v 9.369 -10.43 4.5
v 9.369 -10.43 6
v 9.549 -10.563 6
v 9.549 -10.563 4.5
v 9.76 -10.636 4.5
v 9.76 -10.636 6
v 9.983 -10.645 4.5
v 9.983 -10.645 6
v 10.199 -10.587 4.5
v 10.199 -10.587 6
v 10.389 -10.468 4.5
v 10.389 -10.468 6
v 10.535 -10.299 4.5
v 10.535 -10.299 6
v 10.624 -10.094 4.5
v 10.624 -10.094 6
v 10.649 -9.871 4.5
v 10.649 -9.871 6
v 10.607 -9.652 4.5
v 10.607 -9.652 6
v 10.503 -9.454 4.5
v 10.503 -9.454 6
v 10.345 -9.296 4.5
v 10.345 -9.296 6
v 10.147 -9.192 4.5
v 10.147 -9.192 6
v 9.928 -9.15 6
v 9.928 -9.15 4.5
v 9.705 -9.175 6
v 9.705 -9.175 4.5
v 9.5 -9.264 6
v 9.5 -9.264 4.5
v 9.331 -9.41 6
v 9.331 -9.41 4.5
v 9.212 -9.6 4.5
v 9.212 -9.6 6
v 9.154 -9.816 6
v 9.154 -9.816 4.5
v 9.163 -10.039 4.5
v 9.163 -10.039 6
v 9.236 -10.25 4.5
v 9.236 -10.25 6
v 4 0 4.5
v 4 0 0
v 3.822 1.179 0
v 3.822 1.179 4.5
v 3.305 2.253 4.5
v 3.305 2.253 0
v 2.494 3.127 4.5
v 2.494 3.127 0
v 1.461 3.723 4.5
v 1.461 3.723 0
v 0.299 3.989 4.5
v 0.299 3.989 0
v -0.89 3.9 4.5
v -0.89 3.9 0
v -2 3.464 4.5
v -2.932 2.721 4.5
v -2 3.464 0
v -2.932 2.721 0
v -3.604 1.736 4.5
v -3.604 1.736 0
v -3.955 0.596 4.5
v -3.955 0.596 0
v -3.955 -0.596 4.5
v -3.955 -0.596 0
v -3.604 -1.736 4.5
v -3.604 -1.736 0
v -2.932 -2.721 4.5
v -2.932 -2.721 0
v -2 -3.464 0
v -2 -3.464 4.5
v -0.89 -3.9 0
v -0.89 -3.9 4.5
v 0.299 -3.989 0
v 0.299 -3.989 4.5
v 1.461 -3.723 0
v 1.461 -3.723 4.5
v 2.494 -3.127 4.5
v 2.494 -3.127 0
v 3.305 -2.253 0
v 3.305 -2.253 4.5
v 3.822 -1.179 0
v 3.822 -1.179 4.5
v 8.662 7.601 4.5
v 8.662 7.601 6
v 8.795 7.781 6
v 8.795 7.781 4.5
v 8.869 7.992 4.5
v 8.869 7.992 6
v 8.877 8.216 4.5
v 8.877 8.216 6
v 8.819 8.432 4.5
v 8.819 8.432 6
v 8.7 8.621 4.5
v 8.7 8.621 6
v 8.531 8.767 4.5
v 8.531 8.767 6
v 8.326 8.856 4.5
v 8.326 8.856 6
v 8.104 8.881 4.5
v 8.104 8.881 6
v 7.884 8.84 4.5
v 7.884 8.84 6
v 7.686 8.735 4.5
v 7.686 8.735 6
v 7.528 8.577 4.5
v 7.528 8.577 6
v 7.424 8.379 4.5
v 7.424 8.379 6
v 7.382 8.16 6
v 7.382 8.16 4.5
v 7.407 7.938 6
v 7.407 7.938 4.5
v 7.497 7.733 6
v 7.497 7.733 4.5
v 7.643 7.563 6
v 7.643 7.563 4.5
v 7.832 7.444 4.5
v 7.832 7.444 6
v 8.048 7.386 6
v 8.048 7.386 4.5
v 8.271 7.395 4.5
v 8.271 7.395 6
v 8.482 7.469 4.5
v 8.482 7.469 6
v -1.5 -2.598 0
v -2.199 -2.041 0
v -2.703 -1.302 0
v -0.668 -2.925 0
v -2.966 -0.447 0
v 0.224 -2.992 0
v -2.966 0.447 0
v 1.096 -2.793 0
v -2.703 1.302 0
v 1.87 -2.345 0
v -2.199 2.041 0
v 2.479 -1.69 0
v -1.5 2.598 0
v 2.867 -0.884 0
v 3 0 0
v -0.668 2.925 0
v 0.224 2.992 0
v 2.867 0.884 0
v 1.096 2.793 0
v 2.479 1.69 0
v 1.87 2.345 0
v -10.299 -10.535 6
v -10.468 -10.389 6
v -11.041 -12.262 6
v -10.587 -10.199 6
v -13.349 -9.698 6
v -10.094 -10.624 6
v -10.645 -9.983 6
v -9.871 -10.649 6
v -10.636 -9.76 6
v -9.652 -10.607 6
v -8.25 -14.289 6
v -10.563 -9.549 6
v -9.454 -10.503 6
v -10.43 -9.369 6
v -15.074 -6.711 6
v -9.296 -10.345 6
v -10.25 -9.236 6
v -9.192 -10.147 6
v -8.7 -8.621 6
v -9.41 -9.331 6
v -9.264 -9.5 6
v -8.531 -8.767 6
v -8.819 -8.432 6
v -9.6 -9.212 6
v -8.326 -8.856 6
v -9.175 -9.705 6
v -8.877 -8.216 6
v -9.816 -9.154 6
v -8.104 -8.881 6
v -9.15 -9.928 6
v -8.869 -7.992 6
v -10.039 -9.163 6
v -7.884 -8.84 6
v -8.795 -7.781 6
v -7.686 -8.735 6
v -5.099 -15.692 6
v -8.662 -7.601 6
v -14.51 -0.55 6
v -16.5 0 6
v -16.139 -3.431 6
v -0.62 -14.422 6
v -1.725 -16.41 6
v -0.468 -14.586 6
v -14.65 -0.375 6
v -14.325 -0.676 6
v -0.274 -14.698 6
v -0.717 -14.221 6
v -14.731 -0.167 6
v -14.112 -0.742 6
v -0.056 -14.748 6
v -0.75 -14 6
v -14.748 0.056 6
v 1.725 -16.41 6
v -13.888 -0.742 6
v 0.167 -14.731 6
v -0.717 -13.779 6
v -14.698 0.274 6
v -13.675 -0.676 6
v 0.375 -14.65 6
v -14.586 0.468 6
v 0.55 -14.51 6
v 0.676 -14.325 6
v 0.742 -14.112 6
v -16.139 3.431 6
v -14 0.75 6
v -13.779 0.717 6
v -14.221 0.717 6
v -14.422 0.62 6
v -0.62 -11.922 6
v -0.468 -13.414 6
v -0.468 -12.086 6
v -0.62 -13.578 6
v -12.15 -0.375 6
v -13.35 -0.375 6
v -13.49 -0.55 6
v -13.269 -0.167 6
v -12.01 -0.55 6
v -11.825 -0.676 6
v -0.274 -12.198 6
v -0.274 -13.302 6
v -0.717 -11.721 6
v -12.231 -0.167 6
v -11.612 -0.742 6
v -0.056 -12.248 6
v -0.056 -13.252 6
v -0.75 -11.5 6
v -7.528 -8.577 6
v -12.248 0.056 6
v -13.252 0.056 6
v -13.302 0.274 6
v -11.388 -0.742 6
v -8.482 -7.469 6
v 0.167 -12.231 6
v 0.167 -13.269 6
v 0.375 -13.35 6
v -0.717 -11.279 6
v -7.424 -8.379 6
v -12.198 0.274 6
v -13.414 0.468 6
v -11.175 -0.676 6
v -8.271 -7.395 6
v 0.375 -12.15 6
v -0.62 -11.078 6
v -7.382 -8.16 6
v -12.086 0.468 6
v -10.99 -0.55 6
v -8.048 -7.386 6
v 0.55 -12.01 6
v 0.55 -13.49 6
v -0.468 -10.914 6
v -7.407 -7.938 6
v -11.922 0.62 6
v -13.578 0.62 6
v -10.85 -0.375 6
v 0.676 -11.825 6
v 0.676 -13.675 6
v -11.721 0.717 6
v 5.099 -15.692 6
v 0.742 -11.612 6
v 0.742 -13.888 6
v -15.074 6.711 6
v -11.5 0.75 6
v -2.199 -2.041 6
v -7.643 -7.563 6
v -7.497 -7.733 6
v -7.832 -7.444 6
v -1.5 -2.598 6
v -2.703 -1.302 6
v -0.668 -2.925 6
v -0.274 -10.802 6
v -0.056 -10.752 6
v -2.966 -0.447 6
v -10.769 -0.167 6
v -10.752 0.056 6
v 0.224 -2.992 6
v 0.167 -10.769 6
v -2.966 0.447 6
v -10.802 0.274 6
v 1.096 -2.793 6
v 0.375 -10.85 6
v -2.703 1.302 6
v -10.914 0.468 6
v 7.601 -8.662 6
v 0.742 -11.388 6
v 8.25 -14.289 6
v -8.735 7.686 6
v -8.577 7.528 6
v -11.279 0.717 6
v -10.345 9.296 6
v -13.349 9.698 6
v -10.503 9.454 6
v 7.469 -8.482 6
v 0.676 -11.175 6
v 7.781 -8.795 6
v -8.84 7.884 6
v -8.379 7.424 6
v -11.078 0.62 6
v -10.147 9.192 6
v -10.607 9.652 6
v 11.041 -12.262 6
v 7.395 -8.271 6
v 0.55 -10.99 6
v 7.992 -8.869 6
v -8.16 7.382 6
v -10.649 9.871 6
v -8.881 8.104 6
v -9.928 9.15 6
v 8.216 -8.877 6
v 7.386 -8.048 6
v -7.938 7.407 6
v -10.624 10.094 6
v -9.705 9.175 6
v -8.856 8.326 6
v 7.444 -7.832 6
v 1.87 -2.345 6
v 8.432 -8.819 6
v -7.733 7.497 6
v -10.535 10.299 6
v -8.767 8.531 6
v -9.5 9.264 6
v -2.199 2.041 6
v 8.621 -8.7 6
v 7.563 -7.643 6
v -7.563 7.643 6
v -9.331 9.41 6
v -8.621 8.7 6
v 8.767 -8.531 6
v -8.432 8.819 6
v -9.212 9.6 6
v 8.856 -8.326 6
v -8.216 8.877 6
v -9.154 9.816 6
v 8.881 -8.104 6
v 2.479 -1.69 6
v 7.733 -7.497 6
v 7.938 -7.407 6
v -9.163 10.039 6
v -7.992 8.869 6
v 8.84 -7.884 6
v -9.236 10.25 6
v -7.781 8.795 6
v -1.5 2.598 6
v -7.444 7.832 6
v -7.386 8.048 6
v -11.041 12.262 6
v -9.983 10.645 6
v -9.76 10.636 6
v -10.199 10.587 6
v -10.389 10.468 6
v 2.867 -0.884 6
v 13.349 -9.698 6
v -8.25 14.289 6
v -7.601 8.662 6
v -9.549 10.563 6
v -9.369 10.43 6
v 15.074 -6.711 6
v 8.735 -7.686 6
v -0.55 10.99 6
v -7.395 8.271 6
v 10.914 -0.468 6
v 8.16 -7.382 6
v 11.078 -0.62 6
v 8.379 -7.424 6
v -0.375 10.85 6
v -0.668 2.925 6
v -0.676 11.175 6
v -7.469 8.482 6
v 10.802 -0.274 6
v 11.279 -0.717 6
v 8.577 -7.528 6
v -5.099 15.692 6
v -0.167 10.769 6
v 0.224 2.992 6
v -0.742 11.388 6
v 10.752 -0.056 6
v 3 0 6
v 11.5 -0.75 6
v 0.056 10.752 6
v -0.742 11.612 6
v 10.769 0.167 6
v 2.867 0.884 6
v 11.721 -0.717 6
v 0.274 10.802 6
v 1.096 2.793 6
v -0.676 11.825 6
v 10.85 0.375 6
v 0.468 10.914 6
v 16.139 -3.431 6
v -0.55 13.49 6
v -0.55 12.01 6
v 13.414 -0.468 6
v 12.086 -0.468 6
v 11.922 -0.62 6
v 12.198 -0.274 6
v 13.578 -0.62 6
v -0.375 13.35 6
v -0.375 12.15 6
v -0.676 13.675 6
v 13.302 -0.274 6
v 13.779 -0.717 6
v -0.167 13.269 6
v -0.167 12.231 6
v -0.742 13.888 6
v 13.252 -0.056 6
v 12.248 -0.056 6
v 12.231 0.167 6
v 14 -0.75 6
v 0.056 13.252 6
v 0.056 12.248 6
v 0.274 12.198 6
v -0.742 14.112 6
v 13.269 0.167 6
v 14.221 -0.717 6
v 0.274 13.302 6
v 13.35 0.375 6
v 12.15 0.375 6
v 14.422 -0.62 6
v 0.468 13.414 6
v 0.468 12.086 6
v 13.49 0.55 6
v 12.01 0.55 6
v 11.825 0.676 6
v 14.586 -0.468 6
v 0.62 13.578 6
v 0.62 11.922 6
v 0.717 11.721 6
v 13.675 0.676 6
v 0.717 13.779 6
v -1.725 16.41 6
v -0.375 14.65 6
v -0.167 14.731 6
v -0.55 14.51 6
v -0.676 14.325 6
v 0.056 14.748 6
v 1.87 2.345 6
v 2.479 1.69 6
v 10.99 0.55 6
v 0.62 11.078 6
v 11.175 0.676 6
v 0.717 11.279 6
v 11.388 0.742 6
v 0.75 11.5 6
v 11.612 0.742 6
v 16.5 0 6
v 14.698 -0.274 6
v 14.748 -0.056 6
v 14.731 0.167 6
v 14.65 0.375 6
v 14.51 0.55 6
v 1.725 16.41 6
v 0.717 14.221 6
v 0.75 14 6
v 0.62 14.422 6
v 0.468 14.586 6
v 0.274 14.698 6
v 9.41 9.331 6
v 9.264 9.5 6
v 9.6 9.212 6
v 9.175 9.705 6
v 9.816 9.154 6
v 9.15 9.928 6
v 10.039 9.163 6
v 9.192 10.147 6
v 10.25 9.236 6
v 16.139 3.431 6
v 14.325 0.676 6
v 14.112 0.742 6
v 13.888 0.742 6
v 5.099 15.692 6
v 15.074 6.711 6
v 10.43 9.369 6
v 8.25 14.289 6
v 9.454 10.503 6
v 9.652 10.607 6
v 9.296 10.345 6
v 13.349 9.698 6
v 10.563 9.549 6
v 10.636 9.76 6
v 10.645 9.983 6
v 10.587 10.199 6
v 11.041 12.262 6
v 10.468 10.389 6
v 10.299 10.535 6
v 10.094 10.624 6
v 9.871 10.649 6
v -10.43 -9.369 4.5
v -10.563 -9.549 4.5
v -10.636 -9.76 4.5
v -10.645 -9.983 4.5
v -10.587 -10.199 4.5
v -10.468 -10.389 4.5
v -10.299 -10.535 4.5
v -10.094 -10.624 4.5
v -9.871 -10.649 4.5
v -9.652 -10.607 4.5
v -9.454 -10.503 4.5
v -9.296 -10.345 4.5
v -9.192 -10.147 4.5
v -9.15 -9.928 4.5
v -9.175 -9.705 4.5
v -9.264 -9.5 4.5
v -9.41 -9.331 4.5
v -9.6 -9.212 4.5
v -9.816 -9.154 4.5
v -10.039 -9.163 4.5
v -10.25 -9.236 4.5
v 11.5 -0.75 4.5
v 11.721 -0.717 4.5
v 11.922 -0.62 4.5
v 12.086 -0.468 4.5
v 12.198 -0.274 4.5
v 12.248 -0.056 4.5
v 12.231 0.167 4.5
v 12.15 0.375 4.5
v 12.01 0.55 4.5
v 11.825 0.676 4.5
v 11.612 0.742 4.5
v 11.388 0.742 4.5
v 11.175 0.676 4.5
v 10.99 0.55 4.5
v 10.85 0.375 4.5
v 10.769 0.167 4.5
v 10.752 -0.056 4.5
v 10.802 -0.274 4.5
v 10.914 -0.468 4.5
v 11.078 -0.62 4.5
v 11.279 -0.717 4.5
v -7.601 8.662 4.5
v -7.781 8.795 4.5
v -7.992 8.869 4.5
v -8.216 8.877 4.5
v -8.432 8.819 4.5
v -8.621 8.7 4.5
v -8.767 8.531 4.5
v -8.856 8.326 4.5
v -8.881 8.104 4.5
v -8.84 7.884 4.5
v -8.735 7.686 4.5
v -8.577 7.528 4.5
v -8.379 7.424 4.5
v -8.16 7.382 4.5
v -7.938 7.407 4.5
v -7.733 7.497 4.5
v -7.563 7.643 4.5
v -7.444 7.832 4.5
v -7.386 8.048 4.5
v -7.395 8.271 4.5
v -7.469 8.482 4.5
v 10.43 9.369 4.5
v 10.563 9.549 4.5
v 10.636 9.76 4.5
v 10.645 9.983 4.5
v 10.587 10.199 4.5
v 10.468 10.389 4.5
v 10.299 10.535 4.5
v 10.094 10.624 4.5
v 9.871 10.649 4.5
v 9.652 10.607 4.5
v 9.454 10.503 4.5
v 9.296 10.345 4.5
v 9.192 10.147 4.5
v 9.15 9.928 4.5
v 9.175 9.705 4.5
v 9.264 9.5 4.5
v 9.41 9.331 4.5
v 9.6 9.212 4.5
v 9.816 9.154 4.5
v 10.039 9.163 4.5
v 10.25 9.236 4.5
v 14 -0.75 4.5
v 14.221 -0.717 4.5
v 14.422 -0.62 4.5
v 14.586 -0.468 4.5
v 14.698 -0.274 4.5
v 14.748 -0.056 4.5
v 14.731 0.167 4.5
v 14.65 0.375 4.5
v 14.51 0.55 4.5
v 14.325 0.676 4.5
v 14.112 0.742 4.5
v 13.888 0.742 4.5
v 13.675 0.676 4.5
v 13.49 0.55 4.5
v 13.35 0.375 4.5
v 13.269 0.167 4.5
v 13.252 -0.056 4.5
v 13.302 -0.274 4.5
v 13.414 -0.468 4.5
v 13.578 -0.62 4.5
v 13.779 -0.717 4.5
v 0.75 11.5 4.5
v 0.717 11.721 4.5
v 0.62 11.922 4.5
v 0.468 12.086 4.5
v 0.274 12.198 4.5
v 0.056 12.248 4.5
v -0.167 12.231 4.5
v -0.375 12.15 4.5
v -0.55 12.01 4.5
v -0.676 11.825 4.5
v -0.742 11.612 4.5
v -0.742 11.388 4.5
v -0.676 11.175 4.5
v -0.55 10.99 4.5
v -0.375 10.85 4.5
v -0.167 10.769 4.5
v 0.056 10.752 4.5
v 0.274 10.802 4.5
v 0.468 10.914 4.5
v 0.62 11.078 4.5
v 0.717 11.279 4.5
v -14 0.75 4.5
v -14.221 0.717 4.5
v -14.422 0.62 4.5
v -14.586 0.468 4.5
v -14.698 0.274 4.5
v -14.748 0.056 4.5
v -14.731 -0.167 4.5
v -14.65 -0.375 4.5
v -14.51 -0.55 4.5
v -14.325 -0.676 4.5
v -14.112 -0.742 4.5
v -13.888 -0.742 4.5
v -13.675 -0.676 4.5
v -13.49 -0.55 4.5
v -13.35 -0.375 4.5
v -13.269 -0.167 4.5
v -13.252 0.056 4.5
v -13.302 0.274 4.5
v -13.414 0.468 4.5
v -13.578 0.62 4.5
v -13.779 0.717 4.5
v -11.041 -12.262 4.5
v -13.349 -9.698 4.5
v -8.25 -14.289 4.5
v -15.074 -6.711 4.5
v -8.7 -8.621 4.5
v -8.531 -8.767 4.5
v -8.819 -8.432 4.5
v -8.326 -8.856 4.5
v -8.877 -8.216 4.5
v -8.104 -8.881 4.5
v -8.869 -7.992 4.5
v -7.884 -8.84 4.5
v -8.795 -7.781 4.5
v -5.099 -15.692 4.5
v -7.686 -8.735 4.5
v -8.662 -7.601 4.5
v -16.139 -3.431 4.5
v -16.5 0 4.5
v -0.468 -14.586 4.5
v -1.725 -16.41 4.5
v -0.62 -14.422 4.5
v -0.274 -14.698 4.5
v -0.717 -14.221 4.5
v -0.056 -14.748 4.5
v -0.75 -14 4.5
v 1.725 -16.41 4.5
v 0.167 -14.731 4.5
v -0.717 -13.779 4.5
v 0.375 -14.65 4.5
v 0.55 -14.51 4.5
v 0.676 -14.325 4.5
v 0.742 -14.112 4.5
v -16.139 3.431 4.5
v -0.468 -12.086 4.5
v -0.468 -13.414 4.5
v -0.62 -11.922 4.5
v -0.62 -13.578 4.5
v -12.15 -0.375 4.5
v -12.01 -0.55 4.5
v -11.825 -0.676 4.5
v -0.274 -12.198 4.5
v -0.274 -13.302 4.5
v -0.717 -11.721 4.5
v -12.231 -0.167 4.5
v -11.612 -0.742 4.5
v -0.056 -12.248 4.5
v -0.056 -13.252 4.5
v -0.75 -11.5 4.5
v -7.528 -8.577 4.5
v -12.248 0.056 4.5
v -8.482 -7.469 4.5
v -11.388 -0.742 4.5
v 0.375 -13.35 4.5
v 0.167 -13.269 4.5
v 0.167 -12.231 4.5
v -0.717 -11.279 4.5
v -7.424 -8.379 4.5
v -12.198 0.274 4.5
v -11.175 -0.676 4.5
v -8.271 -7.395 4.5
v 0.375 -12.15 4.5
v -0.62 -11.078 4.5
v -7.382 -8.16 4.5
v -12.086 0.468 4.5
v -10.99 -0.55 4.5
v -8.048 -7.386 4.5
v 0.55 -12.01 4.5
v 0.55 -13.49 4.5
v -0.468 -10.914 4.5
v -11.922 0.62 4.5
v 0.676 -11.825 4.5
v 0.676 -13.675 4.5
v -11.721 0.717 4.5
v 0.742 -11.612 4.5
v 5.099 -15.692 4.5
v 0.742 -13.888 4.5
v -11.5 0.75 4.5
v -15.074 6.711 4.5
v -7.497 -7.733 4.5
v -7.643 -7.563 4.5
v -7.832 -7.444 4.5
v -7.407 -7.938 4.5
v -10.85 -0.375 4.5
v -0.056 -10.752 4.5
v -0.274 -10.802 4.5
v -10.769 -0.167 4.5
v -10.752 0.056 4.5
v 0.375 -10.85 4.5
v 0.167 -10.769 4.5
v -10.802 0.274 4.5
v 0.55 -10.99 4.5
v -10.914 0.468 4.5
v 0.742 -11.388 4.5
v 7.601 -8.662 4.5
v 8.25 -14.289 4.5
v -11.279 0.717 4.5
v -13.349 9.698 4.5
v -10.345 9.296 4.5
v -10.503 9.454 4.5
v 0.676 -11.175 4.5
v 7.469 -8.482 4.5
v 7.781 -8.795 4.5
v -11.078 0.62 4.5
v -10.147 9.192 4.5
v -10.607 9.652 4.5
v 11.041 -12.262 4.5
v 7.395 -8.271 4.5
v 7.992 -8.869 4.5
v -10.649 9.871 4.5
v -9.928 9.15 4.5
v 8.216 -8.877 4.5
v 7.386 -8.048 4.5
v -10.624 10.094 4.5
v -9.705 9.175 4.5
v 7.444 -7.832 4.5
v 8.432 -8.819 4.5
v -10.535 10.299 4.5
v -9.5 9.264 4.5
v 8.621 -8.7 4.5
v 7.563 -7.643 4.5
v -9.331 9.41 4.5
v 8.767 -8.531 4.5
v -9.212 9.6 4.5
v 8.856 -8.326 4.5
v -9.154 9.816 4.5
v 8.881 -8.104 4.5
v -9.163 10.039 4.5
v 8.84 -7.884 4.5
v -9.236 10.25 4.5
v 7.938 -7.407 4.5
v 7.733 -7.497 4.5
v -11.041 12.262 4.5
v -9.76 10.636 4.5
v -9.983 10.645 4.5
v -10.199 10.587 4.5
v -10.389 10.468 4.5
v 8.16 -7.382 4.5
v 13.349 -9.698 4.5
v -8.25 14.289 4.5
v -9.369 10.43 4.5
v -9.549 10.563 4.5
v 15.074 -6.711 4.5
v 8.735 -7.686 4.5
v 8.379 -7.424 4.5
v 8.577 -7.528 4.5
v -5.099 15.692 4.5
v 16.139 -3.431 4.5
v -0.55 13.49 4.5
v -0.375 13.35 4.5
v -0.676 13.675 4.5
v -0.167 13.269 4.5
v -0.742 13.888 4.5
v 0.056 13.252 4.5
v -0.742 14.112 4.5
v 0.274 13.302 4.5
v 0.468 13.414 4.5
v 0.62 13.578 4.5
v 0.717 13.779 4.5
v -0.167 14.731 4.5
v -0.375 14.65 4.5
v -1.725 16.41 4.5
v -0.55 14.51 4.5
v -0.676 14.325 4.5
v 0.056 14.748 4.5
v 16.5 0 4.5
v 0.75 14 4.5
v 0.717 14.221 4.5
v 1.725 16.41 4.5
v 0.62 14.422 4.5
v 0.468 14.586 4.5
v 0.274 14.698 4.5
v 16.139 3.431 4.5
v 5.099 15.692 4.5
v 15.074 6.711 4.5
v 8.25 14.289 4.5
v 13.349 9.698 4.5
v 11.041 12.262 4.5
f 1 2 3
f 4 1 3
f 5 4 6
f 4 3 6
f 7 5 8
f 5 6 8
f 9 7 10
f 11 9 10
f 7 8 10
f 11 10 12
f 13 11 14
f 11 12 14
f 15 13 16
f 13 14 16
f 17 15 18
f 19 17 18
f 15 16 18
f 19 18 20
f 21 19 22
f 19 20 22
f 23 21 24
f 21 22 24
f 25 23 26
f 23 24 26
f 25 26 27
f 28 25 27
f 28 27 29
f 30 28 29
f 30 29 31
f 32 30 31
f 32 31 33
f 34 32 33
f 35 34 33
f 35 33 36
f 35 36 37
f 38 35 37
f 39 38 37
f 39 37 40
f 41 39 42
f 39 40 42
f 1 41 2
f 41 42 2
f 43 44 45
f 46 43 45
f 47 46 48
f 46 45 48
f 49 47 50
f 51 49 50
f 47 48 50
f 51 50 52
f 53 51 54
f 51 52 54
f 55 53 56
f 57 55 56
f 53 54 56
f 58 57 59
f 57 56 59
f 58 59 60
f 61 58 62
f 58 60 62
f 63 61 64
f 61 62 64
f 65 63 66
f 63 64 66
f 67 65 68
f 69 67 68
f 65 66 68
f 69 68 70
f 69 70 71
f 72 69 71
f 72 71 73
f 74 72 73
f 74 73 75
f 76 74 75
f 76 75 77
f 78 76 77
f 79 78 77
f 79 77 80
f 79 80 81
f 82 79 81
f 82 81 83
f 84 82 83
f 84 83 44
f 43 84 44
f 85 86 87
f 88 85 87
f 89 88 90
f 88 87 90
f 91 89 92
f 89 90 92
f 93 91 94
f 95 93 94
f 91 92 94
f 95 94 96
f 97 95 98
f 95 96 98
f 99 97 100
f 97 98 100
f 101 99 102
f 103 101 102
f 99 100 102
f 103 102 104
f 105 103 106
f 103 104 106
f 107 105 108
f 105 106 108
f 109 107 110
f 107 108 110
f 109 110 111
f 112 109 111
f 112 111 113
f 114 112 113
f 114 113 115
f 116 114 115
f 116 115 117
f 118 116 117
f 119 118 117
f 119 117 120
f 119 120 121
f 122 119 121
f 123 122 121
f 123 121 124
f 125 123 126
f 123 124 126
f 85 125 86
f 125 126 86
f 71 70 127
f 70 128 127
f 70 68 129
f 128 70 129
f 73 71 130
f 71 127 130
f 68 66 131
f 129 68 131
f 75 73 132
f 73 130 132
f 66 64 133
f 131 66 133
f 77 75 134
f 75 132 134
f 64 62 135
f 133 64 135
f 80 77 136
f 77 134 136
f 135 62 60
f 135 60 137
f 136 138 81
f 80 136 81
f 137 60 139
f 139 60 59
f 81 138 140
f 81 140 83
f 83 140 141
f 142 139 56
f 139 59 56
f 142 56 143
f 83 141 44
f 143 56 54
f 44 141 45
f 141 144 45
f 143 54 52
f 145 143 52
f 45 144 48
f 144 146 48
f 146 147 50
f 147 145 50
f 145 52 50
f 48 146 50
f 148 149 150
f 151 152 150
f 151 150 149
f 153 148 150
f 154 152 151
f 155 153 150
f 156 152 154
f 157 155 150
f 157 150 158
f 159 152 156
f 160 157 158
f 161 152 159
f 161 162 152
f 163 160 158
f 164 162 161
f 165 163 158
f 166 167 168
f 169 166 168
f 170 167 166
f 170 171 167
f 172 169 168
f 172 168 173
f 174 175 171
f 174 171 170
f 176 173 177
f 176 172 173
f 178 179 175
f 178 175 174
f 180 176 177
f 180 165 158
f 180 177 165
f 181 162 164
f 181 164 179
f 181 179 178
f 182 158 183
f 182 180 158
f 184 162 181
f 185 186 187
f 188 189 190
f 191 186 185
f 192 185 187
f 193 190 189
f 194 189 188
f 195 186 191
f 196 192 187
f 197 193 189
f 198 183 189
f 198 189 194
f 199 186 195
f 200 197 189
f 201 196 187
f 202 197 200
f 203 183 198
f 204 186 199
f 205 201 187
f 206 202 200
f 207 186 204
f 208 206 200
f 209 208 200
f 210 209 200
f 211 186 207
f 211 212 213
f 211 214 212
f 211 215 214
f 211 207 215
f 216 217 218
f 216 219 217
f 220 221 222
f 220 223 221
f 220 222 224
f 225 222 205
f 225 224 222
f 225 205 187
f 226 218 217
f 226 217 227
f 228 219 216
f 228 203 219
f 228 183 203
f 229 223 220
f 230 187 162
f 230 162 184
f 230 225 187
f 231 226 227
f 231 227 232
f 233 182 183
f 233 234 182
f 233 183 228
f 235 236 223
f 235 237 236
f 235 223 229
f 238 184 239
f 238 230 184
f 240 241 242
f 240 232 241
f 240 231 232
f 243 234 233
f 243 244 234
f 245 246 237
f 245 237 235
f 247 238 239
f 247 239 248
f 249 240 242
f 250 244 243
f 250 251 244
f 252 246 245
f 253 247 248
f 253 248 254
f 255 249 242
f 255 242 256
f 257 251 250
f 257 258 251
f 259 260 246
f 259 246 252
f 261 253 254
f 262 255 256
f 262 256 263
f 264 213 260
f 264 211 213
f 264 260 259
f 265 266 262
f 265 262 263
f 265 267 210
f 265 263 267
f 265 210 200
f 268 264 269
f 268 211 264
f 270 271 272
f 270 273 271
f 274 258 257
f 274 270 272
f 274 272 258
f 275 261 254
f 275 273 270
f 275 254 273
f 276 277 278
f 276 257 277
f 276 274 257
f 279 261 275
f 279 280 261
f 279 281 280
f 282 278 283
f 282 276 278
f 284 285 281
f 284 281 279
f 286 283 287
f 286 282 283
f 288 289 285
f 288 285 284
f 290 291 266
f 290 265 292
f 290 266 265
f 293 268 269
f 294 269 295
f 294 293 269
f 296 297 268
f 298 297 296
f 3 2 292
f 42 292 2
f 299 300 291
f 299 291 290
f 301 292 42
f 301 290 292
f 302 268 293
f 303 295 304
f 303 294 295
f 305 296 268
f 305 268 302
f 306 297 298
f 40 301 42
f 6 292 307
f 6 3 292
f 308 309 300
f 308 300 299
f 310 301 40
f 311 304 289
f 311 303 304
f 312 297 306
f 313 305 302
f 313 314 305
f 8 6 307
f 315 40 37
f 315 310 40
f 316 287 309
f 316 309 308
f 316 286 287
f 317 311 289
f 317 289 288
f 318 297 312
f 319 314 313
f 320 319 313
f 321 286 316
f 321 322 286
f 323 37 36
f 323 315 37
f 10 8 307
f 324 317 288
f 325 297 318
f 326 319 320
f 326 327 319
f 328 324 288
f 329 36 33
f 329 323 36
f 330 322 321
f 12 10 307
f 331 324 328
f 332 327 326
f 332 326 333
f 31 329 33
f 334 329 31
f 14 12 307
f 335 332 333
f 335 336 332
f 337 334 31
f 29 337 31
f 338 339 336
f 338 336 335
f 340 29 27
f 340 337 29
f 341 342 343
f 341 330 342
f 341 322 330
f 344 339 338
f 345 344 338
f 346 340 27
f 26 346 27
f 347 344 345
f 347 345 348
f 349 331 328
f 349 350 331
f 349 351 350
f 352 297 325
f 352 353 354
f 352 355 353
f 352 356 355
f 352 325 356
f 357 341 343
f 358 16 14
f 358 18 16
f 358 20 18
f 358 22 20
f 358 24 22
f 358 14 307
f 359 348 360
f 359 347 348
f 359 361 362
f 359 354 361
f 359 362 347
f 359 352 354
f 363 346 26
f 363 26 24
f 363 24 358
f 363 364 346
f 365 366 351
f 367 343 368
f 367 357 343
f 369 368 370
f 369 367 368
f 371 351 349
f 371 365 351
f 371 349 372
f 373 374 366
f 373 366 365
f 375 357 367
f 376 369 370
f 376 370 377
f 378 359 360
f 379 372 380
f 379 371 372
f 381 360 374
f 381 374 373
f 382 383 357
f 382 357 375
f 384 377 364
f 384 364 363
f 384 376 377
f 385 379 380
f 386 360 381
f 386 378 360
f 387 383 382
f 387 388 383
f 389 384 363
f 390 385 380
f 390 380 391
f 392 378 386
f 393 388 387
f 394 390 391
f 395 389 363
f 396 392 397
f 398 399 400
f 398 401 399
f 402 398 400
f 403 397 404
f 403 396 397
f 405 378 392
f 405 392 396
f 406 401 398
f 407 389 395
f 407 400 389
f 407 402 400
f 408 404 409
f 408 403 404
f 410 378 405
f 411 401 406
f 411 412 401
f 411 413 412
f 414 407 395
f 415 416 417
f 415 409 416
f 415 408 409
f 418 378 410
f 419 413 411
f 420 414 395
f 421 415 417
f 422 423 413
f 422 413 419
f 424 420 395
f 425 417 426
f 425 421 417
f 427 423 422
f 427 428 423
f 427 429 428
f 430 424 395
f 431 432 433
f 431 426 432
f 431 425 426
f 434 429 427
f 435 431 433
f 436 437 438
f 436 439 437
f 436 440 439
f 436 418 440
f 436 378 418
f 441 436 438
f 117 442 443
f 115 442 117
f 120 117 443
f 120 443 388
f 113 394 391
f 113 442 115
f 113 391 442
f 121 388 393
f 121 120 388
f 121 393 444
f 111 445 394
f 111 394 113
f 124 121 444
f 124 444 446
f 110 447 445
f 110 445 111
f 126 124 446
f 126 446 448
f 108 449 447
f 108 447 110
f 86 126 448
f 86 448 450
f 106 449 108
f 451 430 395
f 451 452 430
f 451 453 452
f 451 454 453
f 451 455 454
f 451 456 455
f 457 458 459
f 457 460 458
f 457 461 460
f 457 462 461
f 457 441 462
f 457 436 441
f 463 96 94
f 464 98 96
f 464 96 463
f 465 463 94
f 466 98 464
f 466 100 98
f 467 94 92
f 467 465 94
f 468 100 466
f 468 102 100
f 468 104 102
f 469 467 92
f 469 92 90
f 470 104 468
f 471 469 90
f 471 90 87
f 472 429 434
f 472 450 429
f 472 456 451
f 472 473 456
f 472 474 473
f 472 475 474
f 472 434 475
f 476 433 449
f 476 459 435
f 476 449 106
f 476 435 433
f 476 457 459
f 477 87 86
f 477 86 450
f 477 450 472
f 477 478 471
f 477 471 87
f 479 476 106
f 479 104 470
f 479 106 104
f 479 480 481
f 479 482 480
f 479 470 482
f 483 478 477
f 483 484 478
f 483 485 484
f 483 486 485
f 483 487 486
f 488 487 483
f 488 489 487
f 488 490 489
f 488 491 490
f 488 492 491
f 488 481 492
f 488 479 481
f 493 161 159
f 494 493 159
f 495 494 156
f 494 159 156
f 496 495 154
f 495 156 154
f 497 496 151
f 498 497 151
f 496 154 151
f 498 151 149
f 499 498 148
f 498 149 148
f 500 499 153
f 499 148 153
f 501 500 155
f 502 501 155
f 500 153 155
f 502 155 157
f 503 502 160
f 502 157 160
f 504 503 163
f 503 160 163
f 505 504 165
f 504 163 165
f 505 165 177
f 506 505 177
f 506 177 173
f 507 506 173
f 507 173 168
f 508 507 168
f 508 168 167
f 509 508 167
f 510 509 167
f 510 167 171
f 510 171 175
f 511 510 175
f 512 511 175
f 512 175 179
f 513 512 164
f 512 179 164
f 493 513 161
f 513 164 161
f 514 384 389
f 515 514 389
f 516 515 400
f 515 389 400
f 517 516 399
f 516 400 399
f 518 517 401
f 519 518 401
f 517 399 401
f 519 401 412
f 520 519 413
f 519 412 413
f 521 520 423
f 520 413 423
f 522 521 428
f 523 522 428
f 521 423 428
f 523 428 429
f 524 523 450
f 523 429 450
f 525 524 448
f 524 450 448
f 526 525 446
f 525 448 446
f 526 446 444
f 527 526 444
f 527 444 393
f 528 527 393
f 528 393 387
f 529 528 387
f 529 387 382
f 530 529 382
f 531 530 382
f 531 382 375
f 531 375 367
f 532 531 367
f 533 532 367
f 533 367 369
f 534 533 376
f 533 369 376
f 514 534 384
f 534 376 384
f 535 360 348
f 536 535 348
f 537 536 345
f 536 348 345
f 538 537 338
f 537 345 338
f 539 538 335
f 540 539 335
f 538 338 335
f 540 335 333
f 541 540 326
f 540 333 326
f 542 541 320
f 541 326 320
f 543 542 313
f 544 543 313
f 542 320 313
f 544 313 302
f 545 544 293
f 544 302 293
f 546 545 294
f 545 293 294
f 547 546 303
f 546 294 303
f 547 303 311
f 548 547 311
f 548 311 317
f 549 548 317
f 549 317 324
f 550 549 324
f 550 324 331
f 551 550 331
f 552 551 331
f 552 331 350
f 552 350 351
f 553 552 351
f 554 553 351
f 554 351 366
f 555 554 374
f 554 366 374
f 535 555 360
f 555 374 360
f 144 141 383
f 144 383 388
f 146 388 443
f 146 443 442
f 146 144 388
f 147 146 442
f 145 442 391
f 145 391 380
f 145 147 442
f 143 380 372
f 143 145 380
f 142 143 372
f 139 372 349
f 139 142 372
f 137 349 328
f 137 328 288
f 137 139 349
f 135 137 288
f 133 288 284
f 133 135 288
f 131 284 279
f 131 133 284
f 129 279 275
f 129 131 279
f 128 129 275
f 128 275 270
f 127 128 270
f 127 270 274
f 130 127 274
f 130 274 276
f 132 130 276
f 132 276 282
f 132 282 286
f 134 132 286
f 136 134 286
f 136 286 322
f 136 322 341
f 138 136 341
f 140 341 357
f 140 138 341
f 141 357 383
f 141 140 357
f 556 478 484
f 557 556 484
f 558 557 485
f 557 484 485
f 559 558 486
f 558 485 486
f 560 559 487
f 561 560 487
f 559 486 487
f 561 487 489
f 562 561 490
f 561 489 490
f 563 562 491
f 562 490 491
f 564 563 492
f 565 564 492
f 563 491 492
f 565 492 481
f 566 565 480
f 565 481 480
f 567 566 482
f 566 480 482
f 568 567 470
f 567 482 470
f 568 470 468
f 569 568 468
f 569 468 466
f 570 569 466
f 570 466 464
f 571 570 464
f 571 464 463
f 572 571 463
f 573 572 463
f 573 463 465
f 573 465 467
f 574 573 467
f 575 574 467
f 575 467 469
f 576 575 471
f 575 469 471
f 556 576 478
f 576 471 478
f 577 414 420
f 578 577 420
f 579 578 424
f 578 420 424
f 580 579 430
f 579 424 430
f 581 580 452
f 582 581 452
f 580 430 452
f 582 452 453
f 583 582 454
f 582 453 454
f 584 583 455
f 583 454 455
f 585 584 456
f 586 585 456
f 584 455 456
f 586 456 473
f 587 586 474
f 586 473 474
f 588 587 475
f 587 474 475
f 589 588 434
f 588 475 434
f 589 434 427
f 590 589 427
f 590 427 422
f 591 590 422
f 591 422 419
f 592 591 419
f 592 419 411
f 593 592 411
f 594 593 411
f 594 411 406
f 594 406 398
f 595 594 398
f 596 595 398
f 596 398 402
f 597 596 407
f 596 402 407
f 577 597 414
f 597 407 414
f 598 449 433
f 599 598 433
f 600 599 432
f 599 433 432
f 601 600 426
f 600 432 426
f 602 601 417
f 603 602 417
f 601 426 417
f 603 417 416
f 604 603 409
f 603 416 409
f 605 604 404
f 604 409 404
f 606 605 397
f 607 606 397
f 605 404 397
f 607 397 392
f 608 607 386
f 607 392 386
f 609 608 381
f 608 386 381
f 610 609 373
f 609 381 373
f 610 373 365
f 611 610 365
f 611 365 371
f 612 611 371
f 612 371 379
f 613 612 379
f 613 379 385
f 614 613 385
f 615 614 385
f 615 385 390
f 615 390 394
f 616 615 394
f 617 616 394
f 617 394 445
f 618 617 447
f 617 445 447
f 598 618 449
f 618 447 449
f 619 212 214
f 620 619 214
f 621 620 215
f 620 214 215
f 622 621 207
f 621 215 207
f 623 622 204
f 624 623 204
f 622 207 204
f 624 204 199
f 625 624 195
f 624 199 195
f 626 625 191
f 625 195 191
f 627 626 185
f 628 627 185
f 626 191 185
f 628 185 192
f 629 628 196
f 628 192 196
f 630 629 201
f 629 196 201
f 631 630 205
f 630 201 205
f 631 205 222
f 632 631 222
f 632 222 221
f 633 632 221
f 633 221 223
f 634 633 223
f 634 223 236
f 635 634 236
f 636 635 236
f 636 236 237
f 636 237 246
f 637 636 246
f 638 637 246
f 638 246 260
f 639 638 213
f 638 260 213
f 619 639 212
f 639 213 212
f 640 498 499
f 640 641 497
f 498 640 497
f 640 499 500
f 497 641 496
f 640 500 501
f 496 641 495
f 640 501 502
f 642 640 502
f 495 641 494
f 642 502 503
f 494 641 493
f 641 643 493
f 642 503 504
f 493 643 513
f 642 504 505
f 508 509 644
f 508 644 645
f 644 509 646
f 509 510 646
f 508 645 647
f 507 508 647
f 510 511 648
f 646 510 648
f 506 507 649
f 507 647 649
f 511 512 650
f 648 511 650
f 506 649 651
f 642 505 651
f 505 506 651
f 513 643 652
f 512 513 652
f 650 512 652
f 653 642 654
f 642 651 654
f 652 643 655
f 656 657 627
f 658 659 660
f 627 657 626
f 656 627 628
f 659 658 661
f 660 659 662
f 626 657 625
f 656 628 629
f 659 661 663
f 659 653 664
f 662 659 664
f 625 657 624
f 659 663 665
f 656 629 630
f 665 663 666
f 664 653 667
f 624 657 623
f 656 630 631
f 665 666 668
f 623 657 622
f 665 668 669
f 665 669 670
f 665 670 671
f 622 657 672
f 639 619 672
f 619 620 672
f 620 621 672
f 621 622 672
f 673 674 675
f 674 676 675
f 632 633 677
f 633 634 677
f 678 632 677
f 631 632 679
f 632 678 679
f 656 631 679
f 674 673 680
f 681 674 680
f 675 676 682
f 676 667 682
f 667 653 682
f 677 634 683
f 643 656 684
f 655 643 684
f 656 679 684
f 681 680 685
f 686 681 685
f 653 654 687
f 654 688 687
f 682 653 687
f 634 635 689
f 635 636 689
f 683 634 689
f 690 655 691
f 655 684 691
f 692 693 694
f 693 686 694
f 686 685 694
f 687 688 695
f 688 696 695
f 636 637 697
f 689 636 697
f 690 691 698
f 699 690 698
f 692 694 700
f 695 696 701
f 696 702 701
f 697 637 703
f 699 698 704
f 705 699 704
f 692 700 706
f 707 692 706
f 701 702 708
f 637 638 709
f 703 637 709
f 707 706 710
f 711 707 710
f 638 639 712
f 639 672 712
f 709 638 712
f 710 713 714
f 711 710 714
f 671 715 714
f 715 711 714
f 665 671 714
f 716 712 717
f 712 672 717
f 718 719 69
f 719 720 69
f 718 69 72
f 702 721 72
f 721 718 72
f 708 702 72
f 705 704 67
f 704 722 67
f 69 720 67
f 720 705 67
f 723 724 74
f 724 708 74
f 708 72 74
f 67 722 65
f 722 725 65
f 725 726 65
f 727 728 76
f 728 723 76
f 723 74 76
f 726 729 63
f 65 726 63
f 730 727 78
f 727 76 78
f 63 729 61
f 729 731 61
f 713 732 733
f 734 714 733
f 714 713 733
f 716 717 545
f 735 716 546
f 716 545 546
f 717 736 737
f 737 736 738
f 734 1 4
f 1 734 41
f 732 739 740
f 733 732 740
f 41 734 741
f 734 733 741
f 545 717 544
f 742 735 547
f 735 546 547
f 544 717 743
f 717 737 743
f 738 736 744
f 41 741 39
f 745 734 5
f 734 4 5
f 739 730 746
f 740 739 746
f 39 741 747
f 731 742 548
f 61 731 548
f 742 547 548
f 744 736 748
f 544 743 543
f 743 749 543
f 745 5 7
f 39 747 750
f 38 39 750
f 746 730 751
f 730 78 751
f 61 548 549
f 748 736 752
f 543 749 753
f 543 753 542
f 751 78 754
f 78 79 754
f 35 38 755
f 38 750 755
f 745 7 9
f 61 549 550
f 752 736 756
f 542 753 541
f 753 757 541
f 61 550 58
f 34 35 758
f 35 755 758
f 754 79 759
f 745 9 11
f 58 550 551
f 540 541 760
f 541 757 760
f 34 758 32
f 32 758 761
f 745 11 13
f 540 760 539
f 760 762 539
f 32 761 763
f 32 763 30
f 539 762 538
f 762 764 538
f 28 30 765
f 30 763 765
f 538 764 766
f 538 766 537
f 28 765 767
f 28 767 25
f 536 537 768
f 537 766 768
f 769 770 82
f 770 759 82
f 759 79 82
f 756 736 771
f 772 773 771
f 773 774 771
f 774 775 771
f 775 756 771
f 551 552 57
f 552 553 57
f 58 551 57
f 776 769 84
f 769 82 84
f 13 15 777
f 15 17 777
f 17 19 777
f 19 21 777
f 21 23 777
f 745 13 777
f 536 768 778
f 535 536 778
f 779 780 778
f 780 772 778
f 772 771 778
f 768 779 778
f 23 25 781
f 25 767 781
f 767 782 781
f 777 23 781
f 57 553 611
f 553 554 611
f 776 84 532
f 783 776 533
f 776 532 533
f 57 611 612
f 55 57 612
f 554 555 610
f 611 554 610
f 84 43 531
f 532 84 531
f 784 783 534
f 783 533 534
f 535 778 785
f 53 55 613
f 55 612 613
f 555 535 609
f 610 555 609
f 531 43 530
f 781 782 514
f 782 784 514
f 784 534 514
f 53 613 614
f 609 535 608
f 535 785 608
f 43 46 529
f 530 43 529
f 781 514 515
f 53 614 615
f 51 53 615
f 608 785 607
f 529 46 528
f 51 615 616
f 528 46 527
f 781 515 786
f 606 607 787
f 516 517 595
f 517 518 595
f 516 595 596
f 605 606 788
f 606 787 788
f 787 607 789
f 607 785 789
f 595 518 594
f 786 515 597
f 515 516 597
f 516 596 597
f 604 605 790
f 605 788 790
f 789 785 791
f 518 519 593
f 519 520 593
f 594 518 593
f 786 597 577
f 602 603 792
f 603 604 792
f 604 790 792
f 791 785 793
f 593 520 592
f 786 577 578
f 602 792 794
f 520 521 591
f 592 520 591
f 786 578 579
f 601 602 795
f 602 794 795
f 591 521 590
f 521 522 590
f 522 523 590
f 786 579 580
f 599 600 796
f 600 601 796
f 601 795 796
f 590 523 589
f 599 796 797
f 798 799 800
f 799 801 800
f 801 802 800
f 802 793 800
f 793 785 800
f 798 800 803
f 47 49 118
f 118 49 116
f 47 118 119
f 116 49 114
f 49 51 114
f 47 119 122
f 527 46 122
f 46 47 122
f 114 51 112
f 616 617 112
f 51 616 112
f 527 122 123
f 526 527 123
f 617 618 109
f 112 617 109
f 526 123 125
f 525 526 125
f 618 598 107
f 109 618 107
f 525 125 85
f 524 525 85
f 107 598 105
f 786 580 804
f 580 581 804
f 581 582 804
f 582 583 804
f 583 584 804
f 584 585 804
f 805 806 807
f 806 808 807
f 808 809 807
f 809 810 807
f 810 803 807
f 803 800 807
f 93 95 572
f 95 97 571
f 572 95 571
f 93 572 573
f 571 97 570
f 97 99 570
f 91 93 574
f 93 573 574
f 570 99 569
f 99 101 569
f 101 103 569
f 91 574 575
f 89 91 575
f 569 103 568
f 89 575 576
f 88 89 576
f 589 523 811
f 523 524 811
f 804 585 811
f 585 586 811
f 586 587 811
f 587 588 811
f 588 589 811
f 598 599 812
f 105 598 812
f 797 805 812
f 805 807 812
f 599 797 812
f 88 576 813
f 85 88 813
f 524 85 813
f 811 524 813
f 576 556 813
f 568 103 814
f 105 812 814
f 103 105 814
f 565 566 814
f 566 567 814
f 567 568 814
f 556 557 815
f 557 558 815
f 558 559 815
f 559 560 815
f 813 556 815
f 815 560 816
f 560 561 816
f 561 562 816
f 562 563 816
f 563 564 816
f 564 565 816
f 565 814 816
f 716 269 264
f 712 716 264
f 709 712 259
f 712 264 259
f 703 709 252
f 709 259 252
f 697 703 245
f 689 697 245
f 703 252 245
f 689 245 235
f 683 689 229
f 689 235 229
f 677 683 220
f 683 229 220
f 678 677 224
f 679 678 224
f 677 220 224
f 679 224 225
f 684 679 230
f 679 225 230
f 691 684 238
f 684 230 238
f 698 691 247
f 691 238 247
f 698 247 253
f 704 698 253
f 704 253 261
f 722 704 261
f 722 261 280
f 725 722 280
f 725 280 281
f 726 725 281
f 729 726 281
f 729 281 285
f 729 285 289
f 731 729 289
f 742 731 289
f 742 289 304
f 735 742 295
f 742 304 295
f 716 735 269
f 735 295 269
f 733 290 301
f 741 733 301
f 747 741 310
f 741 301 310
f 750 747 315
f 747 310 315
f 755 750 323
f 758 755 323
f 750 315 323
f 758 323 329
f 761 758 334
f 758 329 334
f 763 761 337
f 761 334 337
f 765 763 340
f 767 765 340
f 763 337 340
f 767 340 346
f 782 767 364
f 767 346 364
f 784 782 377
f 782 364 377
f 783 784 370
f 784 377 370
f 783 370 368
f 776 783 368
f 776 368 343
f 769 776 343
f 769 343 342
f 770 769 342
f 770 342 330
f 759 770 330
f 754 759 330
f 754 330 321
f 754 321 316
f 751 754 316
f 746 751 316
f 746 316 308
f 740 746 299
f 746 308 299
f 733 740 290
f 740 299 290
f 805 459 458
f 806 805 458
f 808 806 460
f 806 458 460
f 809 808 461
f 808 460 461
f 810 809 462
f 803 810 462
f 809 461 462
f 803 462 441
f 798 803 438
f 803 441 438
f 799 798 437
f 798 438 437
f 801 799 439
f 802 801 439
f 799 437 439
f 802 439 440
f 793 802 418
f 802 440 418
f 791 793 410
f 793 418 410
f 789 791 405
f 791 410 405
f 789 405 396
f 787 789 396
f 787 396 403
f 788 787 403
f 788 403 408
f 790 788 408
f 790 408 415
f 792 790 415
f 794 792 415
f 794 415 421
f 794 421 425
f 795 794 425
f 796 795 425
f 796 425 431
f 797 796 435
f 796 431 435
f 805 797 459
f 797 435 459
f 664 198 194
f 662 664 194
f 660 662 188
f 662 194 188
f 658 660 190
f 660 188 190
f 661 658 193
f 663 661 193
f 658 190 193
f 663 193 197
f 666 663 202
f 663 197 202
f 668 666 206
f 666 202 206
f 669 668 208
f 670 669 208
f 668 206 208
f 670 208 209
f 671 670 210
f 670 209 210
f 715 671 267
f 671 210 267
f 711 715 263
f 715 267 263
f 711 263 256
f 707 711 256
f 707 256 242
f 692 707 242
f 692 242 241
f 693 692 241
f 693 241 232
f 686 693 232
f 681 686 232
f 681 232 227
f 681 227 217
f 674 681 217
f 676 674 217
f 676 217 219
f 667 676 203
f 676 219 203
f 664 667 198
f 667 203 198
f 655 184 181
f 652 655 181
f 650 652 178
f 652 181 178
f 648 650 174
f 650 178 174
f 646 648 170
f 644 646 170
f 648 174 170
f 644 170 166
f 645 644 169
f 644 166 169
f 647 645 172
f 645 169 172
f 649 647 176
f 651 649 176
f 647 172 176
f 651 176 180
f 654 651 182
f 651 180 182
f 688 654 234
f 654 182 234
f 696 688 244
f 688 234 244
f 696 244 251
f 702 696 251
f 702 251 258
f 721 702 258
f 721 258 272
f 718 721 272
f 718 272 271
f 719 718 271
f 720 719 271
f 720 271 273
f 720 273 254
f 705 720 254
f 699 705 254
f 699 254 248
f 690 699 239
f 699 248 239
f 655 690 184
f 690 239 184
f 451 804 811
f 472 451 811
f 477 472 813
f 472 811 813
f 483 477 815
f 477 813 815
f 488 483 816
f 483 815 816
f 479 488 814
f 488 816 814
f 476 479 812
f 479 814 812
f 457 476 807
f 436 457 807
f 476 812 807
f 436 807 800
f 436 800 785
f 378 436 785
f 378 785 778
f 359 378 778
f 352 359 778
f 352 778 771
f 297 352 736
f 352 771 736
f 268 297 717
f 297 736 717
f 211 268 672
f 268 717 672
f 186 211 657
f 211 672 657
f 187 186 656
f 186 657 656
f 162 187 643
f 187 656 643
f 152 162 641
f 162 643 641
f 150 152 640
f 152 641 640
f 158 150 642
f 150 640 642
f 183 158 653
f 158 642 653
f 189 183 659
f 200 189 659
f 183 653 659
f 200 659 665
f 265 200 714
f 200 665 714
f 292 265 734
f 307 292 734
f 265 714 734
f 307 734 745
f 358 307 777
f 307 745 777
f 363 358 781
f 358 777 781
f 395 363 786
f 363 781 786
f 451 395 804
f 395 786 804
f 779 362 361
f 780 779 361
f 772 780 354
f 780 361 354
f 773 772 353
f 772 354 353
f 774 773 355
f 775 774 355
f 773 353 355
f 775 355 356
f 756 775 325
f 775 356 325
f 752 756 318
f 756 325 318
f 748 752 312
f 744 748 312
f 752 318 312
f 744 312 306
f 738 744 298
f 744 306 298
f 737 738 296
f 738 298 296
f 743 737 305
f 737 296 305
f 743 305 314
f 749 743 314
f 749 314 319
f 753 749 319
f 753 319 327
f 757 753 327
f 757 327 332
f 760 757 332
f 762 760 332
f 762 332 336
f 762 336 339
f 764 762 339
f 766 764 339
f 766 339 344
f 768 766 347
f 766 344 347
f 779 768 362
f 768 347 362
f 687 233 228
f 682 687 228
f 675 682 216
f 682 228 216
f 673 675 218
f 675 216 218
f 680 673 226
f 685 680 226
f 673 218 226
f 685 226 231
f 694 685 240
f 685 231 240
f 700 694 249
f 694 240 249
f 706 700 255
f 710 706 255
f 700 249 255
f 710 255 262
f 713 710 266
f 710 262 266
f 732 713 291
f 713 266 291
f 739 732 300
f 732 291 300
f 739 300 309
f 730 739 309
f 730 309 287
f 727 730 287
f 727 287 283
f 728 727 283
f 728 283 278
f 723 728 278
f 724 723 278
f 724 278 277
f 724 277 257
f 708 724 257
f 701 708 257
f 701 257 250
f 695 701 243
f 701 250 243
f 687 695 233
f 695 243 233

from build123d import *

# Parameters (mm, degrees)
SKETCH_1_R               = 4
SKETCH_1_R_2             = 3
EXTRUDE_1_DEPTH          = 6
EXTRUDE_START            = -1.5
SKETCH_2_R               = 16.5
SKETCH_2_R_2             = 4
EXTRUDE_2_DEPTH          = 1.5
SKETCH_4_R               = 0.75
CUT_EXTRUDE_1_DEPTH      = 1.5
PATTERN_CIRCULAR_1_COUNT = 8


with BuildPart() as part:
    # 草图1 → 凸台-拉伸1 (new body)
    with BuildSketch(Plane.XY):
        Circle(SKETCH_1_R)
        Circle(SKETCH_1_R_2, mode=Mode.SUBTRACT)
    extrude(amount=EXTRUDE_1_DEPTH)

    # 草图2 → 凸台-拉伸2 (add)
    with BuildSketch(Plane.XY.offset(6).offset(EXTRUDE_START)):
        Circle(SKETCH_2_R)
        Circle(SKETCH_2_R_2, mode=Mode.SUBTRACT)
    extrude(amount=EXTRUDE_2_DEPTH)

    # 草图4 → 切除-拉伸1 (cut)
    with BuildSketch(Plane.XY.offset(6)):
        with Locations((0, 14)):
            Circle(SKETCH_4_R)
        with Locations((0, 11.5)):
            Circle(SKETCH_4_R)
    cut_extrude_1 = extrude(amount=-CUT_EXTRUDE_1_DEPTH, mode=Mode.SUBTRACT)

    # 阵列(圆周)1: 切除-拉伸1 ×8 about axis
    pattern_circular_1_axis = Axis((0, 0, 4.5), (0, 0, 1))
    for i in range(1, PATTERN_CIRCULAR_1_COUNT):
        add(cut_extrude_1.rotate(pattern_circular_1_axis, i * 360 / PATTERN_CIRCULAR_1_COUNT), mode=Mode.SUBTRACT)


solid = part.part
